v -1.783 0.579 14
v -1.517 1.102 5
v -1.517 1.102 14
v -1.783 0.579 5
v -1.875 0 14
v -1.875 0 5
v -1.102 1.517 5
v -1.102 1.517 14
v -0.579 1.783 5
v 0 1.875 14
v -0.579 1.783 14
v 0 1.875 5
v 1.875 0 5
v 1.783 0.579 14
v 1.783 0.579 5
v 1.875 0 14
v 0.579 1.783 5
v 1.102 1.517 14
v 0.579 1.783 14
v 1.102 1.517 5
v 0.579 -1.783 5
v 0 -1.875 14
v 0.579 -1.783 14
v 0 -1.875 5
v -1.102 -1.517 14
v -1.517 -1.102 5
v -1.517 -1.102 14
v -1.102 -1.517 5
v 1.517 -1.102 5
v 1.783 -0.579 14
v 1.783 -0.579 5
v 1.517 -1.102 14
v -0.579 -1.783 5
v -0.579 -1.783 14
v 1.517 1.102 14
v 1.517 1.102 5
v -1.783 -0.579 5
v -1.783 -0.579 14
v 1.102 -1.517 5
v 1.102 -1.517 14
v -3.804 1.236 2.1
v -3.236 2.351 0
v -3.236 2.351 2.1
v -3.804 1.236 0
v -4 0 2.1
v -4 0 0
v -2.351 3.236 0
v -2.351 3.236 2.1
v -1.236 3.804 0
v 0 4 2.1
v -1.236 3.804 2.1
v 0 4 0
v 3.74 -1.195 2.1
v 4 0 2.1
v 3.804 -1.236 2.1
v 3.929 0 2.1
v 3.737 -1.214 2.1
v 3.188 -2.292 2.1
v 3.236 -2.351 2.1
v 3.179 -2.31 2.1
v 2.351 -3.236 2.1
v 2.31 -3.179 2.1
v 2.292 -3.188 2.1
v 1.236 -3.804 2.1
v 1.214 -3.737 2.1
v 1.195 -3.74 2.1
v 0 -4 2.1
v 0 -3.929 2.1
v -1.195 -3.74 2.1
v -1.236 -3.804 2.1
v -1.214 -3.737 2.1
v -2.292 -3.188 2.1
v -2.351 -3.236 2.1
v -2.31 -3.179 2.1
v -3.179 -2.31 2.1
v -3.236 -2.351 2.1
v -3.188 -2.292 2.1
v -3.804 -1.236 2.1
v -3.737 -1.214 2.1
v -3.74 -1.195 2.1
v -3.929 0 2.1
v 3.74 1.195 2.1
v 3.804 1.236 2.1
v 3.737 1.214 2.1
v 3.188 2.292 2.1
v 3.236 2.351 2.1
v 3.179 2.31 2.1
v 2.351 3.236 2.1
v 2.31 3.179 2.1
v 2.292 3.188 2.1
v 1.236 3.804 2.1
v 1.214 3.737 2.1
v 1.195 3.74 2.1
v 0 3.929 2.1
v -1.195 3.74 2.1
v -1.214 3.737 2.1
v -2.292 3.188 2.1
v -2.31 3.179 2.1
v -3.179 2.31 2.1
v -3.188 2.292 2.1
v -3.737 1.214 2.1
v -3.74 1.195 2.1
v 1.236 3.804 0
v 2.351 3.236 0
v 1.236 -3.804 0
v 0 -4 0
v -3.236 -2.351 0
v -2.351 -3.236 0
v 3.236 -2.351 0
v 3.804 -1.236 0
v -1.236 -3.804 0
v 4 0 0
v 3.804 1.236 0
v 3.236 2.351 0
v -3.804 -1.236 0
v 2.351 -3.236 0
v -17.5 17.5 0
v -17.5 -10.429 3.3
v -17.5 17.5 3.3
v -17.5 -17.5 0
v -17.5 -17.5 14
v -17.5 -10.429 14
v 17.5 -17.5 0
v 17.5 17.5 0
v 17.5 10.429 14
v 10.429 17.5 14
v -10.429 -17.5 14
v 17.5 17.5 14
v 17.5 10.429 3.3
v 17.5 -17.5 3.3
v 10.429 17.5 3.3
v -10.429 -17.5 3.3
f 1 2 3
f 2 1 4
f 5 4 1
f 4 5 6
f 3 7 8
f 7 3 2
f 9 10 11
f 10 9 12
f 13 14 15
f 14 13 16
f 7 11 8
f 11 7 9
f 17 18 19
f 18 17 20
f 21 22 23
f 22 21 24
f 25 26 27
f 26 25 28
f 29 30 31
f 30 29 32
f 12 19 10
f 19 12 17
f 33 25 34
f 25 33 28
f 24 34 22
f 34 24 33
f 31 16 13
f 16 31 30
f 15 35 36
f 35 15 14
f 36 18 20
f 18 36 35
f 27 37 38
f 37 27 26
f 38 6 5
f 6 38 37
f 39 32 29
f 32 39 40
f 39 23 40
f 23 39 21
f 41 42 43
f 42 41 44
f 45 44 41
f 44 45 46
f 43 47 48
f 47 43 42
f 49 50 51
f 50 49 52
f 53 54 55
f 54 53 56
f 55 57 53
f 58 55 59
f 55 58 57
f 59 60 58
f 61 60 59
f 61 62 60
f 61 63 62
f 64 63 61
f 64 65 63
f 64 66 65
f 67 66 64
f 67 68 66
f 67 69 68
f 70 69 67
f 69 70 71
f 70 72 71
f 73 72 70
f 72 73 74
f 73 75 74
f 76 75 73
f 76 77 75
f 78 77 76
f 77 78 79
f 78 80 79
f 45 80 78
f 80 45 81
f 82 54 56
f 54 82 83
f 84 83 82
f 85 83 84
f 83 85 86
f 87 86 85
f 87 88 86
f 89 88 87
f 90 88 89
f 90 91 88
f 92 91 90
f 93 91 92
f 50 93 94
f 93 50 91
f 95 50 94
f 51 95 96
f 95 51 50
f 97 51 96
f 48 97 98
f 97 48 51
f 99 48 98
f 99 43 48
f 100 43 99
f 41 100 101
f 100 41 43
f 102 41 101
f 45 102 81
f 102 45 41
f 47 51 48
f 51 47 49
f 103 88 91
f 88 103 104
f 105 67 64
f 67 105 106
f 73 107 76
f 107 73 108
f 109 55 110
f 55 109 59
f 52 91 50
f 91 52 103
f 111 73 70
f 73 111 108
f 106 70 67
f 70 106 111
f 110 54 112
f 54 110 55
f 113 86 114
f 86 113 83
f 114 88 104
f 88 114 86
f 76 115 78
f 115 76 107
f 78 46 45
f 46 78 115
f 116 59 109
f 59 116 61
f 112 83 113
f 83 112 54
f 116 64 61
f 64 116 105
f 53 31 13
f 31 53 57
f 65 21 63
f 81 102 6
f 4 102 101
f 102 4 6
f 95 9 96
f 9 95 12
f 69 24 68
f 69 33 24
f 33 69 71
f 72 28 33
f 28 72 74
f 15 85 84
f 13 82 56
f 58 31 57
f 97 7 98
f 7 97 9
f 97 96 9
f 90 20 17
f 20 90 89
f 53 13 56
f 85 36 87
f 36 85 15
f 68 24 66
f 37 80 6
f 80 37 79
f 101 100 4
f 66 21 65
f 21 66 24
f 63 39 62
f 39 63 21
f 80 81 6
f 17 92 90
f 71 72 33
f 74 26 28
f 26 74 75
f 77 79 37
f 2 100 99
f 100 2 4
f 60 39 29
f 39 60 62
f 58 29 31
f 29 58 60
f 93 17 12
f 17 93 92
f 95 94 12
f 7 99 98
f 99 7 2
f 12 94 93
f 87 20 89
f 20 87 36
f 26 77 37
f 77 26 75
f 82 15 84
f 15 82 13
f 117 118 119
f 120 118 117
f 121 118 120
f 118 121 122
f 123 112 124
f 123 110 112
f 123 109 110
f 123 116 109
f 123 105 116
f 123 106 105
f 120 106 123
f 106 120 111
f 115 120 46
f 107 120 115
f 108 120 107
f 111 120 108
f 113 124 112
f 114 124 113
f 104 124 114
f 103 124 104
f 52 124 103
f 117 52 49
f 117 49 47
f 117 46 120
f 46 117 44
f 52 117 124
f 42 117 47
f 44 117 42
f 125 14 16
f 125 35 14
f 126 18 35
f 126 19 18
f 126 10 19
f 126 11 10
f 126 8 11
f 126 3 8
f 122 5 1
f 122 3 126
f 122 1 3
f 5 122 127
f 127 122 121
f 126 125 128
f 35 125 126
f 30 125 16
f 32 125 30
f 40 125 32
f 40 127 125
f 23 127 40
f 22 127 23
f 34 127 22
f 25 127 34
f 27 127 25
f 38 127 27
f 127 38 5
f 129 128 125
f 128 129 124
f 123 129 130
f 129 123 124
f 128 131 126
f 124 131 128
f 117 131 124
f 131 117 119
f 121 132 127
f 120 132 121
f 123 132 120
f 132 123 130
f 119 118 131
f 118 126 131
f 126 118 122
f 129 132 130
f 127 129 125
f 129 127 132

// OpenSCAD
// Units are in mm
$fn=20;

/* [Global] */

// How long in mm the mount's sides ar = 35;
edge_length = 35;

// How far in mm the mount will stick off the wall
height = 14;

// Thickness of the bevel in mm between records.
bevel = 10;

// What proportion of the height is left for the record to sit in. 80% on the default height is enough for double-thick records
holder_height_ratio = .8; // [0:.02:1]

// Width in mm or the screw's body. Leave a little wiggle room here for the threads to turn freely.
screw_hole_width = 3.75;

// Width in mm of the screw's head
screw_head_width = 8;

// How high on the model the screw head should sit
screw_height_ratio = .85; // [0:.02:1]

/* [Hidden] */

center_width = sqrt(pow(edge_length / 2, 2) + pow(bevel, 2));


module corner_indent() {
    indent_width = (sqrt(2) / 2) * edge_length - bevel;
    indent_height = 2 * height * holder_height_ratio + 1;
    rotate([0, 0, 45]) {
        translate([-indent_width / 2, -indent_width / 2, -1]) {
            cube([indent_width, indent_width, indent_height / 2]);
        }
    }
}

module edge_indent() {
    offset = sqrt(2) * edge_length;
    indent_width = offset - bevel;
    indent_height = 2 * height * holder_height_ratio + 1;
    rotate([0, 0, 45]) {
        translate([offset / 2, 0, -1]) {
            cube([indent_width, indent_width, indent_height], true);
        }
    }

}

module screw_hole() {
    union() {
        // Screw hole
        translate([0, 0, -1]) cylinder(h=height + 2, d=screw_hole_width);
        translate([0, 0, height * screw_height_ratio]) cylinder(h=height / 2 + 2, d=screw_head_width);
        translate([0, 0, height * screw_height_ratio - 2.9]) cylinder(h=3, d1=screw_hole_width, d2 = screw_head_width, center = false);
    }
}

translate([0, 0, height / 2]) {
    rotate([0, 180, 0]) {
        edge_offset = edge_length / 2;
        difference() {
            cube([edge_length, edge_length, height], true);
            rotate([0, 0, 0]) translate([0, 0, - height / 2]) edge_indent();
            rotate([0, 0, 180]) translate([0, 0, - height / 2]) edge_indent();
            translate([0, 0, -height / 2]) screw_hole();
        }
    }
}
